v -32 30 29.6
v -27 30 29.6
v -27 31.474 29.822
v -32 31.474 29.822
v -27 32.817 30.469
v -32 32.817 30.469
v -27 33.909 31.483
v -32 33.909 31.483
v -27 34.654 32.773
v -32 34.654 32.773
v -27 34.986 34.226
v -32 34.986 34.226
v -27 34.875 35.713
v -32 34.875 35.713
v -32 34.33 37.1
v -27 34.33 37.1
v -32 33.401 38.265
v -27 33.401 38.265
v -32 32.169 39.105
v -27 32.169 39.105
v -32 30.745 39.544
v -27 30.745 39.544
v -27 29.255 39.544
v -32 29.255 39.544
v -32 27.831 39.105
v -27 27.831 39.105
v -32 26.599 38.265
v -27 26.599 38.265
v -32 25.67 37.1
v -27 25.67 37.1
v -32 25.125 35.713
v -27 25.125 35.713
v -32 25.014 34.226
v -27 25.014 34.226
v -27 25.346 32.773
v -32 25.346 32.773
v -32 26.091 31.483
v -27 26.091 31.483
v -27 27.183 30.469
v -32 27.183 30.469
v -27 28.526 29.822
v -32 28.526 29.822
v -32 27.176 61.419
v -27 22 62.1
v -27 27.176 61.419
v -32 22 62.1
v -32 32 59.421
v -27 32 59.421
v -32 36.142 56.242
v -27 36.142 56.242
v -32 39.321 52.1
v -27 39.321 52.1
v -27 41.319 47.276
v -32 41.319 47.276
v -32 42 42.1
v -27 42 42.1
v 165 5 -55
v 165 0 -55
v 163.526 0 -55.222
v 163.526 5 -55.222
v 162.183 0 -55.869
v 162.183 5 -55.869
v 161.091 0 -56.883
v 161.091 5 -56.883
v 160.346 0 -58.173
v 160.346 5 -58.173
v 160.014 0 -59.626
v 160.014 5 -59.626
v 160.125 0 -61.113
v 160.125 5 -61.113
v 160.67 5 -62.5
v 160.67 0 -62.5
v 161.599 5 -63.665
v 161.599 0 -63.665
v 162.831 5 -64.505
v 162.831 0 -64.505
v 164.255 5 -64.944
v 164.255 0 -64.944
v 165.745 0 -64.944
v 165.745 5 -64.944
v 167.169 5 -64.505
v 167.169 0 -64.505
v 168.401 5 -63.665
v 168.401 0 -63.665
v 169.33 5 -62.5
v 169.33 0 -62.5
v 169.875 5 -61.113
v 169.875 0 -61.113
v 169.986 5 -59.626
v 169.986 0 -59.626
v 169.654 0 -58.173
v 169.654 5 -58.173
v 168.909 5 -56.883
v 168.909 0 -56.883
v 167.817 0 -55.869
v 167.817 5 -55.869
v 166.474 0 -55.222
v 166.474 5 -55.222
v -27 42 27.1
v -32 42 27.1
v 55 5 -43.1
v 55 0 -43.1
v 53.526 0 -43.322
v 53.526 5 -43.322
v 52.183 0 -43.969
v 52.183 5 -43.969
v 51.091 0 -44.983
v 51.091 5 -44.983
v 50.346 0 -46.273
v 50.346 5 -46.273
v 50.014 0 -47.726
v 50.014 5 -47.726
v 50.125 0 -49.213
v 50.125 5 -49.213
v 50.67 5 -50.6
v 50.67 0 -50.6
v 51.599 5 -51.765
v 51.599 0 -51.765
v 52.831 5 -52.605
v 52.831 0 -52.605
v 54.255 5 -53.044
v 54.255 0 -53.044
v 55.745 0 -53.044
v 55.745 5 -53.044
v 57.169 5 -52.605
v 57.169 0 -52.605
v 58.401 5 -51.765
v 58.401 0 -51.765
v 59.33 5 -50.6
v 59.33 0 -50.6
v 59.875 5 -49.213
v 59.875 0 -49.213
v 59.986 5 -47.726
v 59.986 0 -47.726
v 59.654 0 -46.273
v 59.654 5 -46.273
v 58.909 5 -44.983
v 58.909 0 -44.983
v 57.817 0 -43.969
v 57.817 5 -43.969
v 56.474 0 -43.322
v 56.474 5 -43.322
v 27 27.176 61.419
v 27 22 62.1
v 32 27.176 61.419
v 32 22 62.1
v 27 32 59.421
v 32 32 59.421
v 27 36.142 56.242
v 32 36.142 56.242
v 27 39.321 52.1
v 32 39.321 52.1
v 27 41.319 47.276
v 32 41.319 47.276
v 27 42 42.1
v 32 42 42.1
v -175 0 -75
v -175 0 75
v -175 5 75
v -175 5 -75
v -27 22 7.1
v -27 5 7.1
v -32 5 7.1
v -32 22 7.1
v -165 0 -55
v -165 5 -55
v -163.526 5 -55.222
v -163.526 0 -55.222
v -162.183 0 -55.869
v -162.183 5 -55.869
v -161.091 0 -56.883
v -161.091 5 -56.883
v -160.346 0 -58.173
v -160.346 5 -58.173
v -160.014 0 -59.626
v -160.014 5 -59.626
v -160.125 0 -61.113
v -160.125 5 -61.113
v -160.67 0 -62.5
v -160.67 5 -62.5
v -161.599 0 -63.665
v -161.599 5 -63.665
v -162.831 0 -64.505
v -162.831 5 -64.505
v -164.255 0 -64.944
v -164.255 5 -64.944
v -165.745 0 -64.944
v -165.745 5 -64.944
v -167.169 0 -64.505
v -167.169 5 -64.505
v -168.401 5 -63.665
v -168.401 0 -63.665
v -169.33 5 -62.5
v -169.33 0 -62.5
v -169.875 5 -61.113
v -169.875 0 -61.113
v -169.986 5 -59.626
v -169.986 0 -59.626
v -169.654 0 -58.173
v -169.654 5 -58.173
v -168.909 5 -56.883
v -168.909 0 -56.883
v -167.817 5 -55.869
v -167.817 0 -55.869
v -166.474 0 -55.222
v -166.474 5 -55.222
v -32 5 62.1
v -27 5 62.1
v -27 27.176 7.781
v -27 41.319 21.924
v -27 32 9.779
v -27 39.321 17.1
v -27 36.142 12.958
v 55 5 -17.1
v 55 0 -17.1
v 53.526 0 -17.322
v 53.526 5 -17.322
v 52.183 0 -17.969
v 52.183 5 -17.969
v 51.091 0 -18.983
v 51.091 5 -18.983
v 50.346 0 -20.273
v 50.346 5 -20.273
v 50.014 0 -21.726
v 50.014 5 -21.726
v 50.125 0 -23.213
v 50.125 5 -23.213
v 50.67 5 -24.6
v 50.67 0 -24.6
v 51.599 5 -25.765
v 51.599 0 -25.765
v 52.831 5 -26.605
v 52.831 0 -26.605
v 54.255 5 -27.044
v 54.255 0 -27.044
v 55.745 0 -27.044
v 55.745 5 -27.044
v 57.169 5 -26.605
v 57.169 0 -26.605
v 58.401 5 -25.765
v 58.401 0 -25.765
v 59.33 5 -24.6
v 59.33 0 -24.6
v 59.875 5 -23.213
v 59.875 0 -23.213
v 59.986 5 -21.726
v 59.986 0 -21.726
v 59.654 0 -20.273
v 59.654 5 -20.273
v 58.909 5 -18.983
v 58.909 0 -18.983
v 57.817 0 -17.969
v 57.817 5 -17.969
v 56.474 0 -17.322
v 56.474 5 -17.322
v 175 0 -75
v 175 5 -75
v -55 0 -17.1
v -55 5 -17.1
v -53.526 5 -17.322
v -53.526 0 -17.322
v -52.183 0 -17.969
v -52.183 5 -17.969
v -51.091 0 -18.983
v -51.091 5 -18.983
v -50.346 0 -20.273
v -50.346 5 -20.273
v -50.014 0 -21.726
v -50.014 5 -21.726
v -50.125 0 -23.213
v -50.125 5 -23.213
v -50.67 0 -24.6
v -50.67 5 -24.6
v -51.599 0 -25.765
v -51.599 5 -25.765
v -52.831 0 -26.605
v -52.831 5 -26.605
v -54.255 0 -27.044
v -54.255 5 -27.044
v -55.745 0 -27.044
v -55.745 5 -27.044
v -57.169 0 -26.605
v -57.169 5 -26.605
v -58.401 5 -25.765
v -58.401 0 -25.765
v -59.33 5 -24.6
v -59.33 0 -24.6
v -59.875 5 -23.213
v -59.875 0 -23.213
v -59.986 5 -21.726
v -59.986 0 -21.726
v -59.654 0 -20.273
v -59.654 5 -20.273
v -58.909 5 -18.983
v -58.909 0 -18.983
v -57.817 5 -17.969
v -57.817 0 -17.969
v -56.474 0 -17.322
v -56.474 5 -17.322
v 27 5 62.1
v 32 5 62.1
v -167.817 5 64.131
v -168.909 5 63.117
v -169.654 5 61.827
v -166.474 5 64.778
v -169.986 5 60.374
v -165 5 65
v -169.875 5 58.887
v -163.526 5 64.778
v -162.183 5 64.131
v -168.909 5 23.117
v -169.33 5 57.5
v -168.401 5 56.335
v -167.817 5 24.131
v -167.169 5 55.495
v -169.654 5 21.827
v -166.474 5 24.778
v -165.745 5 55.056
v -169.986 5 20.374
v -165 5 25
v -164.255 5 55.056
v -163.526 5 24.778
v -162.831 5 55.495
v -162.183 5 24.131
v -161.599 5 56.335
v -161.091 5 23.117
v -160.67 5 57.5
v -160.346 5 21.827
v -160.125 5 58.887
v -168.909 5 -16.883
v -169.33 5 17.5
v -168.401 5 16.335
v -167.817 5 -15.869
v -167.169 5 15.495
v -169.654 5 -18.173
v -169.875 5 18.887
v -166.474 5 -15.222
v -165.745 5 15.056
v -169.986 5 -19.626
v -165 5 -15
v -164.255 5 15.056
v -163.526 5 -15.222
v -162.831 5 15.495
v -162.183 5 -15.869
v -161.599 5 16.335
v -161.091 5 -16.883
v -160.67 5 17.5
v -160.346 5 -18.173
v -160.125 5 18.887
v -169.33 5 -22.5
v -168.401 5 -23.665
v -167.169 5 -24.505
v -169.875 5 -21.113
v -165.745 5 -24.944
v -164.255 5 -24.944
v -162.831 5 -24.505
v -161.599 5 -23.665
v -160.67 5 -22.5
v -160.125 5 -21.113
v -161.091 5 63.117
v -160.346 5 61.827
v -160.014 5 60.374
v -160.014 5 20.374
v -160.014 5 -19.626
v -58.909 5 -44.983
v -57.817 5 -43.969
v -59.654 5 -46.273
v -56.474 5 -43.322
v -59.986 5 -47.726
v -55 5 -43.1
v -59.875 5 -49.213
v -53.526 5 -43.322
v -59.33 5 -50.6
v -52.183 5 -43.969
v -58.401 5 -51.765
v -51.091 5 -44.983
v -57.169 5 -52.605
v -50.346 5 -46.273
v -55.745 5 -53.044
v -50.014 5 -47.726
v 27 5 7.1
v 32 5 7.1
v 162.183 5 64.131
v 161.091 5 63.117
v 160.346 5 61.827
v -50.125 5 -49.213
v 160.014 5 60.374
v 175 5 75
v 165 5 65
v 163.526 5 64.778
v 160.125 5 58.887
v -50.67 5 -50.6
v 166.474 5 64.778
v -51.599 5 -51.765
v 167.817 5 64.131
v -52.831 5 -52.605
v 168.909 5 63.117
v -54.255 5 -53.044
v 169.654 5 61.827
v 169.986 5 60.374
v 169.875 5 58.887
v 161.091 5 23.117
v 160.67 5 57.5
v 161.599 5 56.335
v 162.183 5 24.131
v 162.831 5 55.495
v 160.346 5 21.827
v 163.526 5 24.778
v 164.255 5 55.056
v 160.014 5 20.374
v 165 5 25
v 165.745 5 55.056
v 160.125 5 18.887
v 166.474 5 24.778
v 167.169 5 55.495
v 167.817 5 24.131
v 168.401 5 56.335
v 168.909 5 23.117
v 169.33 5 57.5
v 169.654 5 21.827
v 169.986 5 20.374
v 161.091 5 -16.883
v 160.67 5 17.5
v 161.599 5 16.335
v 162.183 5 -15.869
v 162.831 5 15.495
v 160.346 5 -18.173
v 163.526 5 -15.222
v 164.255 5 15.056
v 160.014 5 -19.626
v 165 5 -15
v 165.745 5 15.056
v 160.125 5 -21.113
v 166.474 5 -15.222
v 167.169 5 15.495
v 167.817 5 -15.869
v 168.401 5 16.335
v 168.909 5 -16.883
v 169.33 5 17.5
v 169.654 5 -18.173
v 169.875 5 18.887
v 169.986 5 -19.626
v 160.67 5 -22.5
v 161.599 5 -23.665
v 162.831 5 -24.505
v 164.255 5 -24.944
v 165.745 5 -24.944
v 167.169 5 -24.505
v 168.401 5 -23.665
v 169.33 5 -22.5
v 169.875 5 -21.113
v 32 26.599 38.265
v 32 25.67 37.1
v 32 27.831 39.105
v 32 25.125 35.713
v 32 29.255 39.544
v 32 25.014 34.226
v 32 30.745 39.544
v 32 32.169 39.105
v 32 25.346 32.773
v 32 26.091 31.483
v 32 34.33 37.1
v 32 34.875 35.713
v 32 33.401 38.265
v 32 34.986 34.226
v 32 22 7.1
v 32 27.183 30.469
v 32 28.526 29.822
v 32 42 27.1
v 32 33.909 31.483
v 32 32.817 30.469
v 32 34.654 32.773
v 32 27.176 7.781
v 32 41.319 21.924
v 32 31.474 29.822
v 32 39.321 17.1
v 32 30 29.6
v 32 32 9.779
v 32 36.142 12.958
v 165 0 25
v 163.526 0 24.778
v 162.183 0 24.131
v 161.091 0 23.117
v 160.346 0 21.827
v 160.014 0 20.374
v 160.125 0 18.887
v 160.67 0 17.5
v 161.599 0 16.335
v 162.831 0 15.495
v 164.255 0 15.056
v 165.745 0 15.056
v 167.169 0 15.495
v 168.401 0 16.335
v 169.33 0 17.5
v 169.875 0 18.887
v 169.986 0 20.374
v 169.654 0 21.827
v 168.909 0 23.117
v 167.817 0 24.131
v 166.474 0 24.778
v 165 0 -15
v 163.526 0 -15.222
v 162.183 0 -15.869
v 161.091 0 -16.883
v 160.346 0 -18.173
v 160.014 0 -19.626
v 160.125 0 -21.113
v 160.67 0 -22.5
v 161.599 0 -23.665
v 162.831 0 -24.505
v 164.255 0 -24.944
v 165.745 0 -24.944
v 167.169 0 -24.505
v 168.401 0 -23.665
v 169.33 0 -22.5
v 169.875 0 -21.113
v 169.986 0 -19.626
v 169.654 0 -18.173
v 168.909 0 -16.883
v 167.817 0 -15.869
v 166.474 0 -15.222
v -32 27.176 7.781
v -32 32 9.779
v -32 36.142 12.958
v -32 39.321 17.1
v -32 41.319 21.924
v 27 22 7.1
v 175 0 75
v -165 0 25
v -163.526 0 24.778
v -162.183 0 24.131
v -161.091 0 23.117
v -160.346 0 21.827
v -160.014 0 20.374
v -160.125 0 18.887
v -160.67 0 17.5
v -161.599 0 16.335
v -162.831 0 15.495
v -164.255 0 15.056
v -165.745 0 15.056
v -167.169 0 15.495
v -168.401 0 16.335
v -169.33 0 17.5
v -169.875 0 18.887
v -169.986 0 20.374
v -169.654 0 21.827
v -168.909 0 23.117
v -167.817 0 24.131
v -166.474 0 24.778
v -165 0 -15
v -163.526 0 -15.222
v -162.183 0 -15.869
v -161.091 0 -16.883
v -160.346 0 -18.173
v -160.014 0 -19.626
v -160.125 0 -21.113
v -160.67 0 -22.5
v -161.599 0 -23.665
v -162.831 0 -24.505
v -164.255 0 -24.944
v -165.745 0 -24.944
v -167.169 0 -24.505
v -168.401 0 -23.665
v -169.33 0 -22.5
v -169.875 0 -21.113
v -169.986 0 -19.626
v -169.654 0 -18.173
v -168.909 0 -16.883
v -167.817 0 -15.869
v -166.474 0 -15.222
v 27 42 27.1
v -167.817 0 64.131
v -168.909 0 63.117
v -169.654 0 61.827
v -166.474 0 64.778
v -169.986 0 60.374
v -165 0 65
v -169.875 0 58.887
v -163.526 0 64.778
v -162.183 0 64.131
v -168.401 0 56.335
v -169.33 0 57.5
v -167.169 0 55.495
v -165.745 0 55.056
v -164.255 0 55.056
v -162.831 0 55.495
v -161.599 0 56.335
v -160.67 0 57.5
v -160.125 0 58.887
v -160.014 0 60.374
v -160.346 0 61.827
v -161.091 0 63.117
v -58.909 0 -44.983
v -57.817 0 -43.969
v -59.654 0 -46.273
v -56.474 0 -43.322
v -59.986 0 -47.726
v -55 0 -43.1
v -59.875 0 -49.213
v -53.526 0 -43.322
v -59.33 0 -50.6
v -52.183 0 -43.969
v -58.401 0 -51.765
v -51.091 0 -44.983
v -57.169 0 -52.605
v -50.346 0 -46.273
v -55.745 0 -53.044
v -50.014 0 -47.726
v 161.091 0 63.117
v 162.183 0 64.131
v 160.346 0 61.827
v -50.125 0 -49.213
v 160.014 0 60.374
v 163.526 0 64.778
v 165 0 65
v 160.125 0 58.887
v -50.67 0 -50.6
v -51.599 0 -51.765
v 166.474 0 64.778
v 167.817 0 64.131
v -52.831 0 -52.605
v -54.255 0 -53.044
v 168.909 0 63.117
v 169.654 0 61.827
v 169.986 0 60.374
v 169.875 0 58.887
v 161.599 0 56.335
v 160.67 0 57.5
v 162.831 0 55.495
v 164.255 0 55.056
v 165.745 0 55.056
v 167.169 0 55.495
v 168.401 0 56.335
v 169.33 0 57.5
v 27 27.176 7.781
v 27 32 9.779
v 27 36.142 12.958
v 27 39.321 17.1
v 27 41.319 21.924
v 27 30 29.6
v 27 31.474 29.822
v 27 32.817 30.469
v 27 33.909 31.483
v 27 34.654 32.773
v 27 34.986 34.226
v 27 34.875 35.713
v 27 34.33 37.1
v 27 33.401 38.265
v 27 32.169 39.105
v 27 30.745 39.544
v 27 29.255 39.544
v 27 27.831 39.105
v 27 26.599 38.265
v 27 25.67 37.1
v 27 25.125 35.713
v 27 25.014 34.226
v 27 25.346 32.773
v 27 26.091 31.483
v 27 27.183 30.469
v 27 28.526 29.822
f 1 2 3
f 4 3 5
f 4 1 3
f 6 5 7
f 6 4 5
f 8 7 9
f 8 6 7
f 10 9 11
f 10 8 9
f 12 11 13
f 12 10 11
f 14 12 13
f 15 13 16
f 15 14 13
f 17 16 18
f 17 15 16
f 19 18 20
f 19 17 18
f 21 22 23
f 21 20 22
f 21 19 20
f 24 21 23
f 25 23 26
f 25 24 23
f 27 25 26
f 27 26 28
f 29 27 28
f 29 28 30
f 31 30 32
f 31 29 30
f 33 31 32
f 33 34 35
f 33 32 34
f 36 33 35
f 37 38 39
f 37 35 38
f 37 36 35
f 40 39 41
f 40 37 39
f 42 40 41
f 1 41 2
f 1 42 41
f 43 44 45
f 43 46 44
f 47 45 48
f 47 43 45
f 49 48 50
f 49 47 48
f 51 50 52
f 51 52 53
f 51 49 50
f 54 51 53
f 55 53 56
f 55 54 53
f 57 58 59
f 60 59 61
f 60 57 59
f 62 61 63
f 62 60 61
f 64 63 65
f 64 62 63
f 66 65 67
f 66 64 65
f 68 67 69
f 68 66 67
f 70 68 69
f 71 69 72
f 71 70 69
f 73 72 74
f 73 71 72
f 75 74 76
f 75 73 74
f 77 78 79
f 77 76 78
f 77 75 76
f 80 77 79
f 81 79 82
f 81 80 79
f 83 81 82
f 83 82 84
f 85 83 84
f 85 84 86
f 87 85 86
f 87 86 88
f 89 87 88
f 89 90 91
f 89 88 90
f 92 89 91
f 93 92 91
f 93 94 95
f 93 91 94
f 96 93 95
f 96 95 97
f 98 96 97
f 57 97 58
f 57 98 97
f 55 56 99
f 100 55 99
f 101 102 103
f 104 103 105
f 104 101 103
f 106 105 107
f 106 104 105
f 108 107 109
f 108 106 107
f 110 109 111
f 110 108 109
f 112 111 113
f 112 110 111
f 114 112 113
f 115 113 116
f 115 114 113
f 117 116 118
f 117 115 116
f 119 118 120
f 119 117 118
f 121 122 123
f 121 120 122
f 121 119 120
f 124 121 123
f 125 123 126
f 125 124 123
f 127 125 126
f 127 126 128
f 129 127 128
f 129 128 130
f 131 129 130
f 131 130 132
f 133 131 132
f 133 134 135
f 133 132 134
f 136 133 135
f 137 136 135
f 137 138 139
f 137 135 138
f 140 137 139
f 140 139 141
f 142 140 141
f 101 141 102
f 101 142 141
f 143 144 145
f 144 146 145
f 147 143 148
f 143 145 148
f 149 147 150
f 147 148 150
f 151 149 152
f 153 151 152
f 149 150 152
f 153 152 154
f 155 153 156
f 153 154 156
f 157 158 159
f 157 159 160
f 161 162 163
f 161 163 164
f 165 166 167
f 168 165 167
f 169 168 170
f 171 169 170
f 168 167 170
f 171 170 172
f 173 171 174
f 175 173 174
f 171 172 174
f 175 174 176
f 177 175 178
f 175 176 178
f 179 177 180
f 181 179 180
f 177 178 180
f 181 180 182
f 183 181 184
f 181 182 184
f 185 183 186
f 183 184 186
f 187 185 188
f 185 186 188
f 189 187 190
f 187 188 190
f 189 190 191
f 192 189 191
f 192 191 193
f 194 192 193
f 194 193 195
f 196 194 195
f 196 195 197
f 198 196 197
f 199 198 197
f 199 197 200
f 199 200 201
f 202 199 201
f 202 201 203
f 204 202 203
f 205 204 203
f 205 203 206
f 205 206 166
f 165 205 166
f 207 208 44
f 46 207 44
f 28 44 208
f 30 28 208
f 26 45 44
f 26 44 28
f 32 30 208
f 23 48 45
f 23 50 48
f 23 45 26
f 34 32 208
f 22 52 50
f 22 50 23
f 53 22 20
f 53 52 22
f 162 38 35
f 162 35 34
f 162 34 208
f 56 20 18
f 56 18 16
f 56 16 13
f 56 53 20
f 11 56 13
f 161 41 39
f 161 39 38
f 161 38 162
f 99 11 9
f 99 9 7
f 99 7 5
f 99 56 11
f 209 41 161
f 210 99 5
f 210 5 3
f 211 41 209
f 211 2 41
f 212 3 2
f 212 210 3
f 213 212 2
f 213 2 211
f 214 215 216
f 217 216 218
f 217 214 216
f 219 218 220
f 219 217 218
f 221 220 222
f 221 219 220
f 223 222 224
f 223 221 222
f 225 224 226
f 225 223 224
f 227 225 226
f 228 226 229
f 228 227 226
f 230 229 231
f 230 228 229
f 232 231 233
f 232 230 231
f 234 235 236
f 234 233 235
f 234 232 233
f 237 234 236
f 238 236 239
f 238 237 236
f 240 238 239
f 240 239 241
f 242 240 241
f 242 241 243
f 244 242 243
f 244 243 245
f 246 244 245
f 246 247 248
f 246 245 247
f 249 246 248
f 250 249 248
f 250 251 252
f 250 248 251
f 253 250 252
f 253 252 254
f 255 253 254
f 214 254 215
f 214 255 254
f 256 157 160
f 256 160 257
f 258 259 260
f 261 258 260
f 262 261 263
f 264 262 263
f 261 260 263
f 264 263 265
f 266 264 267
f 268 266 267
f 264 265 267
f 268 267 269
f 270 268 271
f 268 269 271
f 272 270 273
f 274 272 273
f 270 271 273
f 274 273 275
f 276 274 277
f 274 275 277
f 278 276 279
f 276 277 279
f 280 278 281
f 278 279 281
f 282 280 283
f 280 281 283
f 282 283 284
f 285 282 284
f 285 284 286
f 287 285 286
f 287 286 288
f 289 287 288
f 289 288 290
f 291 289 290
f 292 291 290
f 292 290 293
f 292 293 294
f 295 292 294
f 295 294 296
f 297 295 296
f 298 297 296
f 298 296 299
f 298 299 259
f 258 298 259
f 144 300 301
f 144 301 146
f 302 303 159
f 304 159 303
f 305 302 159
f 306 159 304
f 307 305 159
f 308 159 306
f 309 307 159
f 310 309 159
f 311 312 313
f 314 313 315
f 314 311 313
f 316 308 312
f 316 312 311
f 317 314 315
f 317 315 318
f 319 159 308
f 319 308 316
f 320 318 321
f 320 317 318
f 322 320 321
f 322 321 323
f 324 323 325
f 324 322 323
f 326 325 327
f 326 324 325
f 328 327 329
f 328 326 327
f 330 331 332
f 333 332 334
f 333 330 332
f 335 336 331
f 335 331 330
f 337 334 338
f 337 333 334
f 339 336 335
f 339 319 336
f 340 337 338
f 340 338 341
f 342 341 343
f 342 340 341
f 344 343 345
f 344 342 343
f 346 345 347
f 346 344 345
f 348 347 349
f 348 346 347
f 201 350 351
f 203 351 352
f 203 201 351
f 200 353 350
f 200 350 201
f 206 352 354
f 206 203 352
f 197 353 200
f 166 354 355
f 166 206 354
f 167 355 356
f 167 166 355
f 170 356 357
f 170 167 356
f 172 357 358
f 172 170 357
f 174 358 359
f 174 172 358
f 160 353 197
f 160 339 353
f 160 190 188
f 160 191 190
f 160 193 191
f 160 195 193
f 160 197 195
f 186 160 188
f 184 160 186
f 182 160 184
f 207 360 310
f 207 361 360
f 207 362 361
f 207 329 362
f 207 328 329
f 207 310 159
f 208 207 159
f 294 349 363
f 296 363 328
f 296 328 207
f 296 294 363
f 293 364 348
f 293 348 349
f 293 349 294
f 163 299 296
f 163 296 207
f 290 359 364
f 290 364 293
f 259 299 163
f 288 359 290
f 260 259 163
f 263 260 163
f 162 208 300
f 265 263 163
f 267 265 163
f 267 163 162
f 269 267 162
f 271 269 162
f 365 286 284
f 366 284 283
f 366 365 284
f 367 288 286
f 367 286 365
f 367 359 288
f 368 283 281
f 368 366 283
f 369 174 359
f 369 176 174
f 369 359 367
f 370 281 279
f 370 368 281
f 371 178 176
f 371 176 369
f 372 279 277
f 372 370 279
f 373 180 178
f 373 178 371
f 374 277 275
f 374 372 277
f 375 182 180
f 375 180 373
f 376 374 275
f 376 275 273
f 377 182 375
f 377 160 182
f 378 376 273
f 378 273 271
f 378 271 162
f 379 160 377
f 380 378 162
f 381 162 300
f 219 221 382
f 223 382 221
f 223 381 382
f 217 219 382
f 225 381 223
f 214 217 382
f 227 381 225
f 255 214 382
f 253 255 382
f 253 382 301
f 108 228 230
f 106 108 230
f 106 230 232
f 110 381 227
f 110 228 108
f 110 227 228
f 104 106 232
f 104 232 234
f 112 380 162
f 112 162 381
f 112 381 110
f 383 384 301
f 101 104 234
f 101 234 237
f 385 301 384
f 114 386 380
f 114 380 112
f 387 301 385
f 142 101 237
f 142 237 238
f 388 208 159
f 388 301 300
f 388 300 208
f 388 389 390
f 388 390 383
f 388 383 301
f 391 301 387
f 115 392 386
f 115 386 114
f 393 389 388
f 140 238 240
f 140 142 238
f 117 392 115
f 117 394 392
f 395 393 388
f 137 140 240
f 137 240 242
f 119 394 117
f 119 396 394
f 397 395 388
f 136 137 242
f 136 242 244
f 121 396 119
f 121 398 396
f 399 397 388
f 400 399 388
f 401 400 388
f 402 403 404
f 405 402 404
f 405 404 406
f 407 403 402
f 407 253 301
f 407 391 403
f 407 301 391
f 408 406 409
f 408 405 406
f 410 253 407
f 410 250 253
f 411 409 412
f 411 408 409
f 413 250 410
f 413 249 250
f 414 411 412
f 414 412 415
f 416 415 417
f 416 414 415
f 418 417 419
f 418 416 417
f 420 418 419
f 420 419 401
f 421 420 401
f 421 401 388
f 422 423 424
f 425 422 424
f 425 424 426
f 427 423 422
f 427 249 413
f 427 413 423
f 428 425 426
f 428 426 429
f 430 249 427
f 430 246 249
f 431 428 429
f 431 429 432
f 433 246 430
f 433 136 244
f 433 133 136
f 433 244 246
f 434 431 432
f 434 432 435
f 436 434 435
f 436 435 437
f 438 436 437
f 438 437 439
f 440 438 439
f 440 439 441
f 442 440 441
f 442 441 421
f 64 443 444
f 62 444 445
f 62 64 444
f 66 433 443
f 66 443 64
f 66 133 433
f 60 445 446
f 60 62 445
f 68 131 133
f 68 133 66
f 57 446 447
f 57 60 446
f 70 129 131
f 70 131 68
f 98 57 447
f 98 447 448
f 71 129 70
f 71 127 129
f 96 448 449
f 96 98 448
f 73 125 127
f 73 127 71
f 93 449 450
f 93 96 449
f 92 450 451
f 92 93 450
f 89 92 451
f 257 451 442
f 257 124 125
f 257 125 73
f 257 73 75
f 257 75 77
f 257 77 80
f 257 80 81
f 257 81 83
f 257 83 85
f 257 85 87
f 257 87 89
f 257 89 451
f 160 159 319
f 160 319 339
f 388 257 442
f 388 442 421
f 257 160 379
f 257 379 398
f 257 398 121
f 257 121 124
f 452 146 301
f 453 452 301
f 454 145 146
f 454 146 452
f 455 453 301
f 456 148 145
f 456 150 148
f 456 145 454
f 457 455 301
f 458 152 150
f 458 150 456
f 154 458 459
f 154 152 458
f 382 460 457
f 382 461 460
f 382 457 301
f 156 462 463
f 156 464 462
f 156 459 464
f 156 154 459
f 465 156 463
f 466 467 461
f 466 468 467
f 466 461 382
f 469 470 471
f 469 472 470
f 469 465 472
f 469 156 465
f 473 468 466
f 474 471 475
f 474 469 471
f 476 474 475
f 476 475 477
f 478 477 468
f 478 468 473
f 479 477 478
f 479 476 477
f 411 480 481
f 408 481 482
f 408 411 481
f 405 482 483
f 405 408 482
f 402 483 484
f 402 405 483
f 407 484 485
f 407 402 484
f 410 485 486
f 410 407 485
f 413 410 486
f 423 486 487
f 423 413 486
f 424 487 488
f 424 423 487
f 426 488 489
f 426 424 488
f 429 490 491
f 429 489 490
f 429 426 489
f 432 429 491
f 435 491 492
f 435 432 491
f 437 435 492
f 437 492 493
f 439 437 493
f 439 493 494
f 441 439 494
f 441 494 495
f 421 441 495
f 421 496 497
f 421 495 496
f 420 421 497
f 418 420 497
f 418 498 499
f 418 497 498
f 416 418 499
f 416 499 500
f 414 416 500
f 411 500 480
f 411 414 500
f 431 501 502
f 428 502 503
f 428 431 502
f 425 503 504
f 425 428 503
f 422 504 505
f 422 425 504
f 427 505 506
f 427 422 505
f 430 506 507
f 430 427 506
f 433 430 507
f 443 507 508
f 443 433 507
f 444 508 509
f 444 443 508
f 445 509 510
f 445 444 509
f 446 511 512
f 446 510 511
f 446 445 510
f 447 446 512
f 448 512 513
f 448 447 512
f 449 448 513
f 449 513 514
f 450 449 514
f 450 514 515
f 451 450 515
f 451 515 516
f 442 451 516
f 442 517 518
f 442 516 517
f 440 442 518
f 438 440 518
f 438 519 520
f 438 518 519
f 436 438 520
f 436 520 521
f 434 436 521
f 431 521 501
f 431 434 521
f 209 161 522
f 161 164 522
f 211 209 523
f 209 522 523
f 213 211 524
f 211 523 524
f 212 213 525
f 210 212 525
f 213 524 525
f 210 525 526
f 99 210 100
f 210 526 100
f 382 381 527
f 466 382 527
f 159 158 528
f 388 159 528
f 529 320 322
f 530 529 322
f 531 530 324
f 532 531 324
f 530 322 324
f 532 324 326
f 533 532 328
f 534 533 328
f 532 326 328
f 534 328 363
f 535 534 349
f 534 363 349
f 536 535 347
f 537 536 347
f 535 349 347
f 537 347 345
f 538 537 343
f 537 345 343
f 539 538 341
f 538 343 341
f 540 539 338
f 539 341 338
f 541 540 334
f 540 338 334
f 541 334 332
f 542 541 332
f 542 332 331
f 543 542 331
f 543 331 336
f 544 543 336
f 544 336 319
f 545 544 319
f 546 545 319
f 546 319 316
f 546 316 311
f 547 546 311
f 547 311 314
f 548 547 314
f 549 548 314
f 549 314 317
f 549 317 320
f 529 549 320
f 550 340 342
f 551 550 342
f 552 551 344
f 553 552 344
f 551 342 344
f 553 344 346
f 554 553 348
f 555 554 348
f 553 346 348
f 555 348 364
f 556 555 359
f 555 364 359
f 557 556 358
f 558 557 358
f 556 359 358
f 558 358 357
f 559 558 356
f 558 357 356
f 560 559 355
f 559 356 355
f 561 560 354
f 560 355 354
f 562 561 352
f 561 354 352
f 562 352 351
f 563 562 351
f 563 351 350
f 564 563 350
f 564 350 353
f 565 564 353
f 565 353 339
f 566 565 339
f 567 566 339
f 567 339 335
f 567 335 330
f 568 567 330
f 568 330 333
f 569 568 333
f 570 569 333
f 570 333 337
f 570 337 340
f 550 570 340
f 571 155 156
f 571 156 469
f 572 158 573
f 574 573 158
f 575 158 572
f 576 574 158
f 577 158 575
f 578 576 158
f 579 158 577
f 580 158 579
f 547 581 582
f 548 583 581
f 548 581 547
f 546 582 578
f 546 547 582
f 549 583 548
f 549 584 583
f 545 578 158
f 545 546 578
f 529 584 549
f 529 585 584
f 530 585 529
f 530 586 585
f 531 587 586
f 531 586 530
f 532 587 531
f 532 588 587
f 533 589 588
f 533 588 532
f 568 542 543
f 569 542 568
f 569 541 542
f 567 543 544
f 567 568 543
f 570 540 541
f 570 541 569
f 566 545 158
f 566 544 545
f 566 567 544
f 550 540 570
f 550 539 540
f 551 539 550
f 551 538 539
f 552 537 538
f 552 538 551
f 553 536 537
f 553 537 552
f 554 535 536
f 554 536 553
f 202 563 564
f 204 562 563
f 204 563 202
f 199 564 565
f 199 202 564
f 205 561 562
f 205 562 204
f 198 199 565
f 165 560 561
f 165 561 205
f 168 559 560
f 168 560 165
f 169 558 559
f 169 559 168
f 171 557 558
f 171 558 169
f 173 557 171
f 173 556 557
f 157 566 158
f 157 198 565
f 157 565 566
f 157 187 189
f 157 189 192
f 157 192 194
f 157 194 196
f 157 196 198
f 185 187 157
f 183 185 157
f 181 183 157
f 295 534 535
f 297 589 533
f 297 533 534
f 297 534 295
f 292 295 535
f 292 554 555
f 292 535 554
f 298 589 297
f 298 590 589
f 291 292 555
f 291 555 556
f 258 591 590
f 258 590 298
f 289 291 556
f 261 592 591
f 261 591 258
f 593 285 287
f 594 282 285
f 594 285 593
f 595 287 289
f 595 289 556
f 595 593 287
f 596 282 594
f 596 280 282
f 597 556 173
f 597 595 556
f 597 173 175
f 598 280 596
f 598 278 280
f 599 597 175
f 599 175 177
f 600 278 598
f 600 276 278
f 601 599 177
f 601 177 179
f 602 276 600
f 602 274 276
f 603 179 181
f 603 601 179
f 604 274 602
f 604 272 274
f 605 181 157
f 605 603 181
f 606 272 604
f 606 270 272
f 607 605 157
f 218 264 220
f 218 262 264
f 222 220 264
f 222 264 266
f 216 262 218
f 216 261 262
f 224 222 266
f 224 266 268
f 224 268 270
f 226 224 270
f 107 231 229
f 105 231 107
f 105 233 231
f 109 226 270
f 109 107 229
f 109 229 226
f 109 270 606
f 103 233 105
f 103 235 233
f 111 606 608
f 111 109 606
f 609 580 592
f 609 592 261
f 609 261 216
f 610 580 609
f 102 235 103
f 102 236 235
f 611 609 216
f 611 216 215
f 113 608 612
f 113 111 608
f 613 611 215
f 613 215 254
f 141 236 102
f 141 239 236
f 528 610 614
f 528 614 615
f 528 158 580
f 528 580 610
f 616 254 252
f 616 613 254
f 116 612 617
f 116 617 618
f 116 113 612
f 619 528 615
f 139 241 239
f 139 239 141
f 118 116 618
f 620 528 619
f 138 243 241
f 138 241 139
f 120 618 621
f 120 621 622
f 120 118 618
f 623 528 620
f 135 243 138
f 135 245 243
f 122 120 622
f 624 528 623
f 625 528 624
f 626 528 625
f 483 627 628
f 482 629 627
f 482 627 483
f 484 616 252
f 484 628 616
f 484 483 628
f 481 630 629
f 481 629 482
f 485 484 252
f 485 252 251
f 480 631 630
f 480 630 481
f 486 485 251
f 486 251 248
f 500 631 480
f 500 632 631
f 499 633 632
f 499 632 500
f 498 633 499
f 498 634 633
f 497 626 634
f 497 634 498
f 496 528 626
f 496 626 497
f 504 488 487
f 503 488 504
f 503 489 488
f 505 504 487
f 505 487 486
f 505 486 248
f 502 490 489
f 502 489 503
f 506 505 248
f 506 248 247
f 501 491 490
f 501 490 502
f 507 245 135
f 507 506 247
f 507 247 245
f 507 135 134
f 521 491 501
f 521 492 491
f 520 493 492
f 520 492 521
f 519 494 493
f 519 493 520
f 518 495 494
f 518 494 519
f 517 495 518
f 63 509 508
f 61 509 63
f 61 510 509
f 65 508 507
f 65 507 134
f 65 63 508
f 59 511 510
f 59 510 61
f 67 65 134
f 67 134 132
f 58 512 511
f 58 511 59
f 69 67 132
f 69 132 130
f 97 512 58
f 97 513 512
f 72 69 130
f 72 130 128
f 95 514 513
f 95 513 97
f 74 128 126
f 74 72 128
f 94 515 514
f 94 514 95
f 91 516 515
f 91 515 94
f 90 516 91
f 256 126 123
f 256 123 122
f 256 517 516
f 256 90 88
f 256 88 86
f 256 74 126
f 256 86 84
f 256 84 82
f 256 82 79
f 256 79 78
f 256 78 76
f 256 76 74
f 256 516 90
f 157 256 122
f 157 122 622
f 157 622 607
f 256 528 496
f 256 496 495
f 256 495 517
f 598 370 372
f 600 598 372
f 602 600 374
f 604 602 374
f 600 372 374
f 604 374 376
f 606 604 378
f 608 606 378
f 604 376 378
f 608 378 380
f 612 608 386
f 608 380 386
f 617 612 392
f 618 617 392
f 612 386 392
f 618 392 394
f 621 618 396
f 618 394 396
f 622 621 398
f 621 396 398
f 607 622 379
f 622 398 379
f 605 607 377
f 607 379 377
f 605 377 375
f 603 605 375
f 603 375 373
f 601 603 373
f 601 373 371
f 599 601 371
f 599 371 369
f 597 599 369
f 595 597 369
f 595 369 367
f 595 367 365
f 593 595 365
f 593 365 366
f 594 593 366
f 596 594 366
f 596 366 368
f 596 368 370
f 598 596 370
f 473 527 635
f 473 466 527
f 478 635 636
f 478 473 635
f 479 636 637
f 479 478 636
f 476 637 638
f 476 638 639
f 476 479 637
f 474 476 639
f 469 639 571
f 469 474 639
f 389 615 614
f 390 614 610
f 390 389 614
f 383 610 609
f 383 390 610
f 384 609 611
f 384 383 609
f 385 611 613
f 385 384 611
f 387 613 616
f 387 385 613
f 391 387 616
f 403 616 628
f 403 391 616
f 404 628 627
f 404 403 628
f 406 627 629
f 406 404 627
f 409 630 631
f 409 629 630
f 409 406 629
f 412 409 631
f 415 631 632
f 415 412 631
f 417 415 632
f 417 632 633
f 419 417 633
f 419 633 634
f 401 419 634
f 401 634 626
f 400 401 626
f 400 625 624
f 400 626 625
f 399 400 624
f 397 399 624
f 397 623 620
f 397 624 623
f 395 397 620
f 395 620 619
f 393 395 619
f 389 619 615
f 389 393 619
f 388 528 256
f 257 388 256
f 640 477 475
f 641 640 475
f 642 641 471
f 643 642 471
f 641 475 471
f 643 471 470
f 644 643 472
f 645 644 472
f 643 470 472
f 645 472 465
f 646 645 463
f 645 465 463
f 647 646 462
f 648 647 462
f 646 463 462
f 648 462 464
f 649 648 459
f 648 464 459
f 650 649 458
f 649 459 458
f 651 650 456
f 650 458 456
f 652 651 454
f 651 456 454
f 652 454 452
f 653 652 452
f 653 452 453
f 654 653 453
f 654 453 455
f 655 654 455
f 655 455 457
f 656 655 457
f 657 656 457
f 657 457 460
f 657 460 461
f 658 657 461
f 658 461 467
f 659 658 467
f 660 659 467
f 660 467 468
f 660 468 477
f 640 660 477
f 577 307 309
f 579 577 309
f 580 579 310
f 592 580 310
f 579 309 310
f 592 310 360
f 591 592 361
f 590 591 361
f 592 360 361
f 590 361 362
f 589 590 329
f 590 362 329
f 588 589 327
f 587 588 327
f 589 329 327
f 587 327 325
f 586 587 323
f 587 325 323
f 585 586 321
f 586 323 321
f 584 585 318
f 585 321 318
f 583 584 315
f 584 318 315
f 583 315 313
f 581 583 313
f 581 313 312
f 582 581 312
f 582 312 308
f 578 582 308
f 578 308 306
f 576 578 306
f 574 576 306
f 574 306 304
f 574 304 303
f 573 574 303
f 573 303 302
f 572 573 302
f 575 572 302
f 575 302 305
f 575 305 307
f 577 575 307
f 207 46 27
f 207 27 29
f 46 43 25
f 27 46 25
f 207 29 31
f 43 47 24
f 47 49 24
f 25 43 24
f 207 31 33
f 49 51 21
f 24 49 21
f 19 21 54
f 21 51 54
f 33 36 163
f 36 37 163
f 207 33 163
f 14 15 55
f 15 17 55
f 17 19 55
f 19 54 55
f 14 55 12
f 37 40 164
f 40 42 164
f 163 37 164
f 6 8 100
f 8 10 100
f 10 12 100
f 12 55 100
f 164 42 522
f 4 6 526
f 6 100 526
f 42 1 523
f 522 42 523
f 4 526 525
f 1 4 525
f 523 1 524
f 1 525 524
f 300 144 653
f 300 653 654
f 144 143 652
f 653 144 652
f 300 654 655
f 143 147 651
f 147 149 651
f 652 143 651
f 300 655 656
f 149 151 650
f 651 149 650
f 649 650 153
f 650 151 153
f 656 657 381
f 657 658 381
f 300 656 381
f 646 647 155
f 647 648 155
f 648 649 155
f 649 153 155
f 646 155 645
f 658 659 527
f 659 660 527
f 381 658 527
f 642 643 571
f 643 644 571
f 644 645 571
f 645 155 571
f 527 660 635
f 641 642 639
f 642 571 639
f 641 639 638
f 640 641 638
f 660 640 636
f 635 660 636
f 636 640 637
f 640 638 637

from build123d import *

# Parameters (mm, degrees)
SKETCH1_W            = 350
SKETCH1_H            = 150
BOSS_EXTRUDE1_DEPTH  = 5
SKETCH2_W            = 55
SKETCH2_H            = 42
BOSS_EXTRUDE2_DEPTH  = 5
SKETCH3_R            = 5
CUT_EXTRUDE1_DEPTH   = 225.138350132
FILLET1_R            = 20
FILLET1_OF_MIRROR1_R = 20
SKETCH5_R            = 5
CUT_EXTRUDE3_DEPTH   = 194.956180618
SKETCH6_R            = 5
CUT_EXTRUDE4_DEPTH   = 194.956180618


with BuildPart() as part:
    # Sketch1 → Boss-Extrude1 (new body)
    with BuildSketch(Plane(origin=(0, 0, 0), x_dir=(1, 0, 0), z_dir=(0, 1, 0))):
        Rectangle(SKETCH1_W, SKETCH1_H)
    extrude(amount=BOSS_EXTRUDE1_DEPTH)

    # Sketch2 → Boss-Extrude2 (add)
    with BuildSketch(Plane(origin=(27, 0, 0), x_dir=(0, 0, -1), z_dir=(1, 0, 0))):
        with Locations((-34.6, 21)):
            Rectangle(SKETCH2_W, SKETCH2_H)
    boss_extrude2 = extrude(amount=BOSS_EXTRUDE2_DEPTH)

    # Sketch3 → Cut-Extrude1 (cut, through all)
    with BuildSketch(Plane(origin=(32, 0, 0), x_dir=(0, 0, -1), z_dir=(1, 0, 0))):
        with Locations((-34.6, 30)):
            Circle(SKETCH3_R)
    cut_extrude1 = extrude(amount=-CUT_EXTRUDE1_DEPTH, mode=Mode.SUBTRACT)

    # Fillet1
    fillet1_edges = [part.edges().sort_by_distance(p)[0] for p in [
        (29.5, 42, 62.1),
        (29.5, 42, 7.1),
    ]]
    fillet(fillet1_edges, radius=FILLET1_R)

    # Mirror1: Boss-Extrude2, Cut-Extrude1 across plane
    add(boss_extrude2.mirror(Plane(origin=(0, 0, 0), x_dir=(0, 0, 1), z_dir=(1, 0, 0))))
    add(cut_extrude1.mirror(Plane(origin=(0, 0, 0), x_dir=(0, 0, 1), z_dir=(1, 0, 0))), mode=Mode.SUBTRACT)

    # Fillet1 of Mirror1
    fillet1_of_mirror1_edges = [part.edges().sort_by_distance(p)[0] for p in [
        (-29.5, 42, 62.1),
        (-29.5, 42, 7.1),
    ]]
    fillet(fillet1_of_mirror1_edges, radius=FILLET1_OF_MIRROR1_R)

    # Sketch5 → Cut-Extrude3 (cut, through all)
    with BuildSketch(Plane(origin=(0, 5, 0), x_dir=(1, 0, 0), z_dir=(0, 1, 0))):
        with Locations(Location((-55, 48.1, 0), (0, 0, 270))):
            Circle(SKETCH5_R)
        with Locations(Location((-55, 22.1, 0), (0, 0, 270))):
            Circle(SKETCH5_R)
    cut_extrude3 = extrude(amount=-CUT_EXTRUDE3_DEPTH, mode=Mode.SUBTRACT)

    # Mirror3: Cut-Extrude3 across plane
    add(cut_extrude3.mirror(Plane(origin=(0, 0, 0), x_dir=(0, 0, 1), z_dir=(1, 0, 0))), mode=Mode.SUBTRACT)

    # Sketch6 → Cut-Extrude4 (cut, through all)
    with BuildSketch(Plane(origin=(0, 5, 0), x_dir=(1, 0, 0), z_dir=(0, 1, 0))):
        with Locations(Location((-165, 60, 0), (0, 0, 270))):
            Circle(SKETCH6_R)
        with Locations(Location((-165, 20, 0), (0, 0, 270))):
            Circle(SKETCH6_R)
        with Locations(Location((-165, -20, 0), (0, 0, 270))):
            Circle(SKETCH6_R)
        with Locations(Location((-165, -60, 0), (0, 0, 270))):
            Circle(SKETCH6_R)
    cut_extrude4 = extrude(amount=-CUT_EXTRUDE4_DEPTH, mode=Mode.SUBTRACT)

    # Mirror4: Cut-Extrude4 across plane
    add(cut_extrude4.mirror(Plane(origin=(0, 0, 0), x_dir=(0, 0, 1), z_dir=(1, 0, 0))), mode=Mode.SUBTRACT)


solid = part.part
